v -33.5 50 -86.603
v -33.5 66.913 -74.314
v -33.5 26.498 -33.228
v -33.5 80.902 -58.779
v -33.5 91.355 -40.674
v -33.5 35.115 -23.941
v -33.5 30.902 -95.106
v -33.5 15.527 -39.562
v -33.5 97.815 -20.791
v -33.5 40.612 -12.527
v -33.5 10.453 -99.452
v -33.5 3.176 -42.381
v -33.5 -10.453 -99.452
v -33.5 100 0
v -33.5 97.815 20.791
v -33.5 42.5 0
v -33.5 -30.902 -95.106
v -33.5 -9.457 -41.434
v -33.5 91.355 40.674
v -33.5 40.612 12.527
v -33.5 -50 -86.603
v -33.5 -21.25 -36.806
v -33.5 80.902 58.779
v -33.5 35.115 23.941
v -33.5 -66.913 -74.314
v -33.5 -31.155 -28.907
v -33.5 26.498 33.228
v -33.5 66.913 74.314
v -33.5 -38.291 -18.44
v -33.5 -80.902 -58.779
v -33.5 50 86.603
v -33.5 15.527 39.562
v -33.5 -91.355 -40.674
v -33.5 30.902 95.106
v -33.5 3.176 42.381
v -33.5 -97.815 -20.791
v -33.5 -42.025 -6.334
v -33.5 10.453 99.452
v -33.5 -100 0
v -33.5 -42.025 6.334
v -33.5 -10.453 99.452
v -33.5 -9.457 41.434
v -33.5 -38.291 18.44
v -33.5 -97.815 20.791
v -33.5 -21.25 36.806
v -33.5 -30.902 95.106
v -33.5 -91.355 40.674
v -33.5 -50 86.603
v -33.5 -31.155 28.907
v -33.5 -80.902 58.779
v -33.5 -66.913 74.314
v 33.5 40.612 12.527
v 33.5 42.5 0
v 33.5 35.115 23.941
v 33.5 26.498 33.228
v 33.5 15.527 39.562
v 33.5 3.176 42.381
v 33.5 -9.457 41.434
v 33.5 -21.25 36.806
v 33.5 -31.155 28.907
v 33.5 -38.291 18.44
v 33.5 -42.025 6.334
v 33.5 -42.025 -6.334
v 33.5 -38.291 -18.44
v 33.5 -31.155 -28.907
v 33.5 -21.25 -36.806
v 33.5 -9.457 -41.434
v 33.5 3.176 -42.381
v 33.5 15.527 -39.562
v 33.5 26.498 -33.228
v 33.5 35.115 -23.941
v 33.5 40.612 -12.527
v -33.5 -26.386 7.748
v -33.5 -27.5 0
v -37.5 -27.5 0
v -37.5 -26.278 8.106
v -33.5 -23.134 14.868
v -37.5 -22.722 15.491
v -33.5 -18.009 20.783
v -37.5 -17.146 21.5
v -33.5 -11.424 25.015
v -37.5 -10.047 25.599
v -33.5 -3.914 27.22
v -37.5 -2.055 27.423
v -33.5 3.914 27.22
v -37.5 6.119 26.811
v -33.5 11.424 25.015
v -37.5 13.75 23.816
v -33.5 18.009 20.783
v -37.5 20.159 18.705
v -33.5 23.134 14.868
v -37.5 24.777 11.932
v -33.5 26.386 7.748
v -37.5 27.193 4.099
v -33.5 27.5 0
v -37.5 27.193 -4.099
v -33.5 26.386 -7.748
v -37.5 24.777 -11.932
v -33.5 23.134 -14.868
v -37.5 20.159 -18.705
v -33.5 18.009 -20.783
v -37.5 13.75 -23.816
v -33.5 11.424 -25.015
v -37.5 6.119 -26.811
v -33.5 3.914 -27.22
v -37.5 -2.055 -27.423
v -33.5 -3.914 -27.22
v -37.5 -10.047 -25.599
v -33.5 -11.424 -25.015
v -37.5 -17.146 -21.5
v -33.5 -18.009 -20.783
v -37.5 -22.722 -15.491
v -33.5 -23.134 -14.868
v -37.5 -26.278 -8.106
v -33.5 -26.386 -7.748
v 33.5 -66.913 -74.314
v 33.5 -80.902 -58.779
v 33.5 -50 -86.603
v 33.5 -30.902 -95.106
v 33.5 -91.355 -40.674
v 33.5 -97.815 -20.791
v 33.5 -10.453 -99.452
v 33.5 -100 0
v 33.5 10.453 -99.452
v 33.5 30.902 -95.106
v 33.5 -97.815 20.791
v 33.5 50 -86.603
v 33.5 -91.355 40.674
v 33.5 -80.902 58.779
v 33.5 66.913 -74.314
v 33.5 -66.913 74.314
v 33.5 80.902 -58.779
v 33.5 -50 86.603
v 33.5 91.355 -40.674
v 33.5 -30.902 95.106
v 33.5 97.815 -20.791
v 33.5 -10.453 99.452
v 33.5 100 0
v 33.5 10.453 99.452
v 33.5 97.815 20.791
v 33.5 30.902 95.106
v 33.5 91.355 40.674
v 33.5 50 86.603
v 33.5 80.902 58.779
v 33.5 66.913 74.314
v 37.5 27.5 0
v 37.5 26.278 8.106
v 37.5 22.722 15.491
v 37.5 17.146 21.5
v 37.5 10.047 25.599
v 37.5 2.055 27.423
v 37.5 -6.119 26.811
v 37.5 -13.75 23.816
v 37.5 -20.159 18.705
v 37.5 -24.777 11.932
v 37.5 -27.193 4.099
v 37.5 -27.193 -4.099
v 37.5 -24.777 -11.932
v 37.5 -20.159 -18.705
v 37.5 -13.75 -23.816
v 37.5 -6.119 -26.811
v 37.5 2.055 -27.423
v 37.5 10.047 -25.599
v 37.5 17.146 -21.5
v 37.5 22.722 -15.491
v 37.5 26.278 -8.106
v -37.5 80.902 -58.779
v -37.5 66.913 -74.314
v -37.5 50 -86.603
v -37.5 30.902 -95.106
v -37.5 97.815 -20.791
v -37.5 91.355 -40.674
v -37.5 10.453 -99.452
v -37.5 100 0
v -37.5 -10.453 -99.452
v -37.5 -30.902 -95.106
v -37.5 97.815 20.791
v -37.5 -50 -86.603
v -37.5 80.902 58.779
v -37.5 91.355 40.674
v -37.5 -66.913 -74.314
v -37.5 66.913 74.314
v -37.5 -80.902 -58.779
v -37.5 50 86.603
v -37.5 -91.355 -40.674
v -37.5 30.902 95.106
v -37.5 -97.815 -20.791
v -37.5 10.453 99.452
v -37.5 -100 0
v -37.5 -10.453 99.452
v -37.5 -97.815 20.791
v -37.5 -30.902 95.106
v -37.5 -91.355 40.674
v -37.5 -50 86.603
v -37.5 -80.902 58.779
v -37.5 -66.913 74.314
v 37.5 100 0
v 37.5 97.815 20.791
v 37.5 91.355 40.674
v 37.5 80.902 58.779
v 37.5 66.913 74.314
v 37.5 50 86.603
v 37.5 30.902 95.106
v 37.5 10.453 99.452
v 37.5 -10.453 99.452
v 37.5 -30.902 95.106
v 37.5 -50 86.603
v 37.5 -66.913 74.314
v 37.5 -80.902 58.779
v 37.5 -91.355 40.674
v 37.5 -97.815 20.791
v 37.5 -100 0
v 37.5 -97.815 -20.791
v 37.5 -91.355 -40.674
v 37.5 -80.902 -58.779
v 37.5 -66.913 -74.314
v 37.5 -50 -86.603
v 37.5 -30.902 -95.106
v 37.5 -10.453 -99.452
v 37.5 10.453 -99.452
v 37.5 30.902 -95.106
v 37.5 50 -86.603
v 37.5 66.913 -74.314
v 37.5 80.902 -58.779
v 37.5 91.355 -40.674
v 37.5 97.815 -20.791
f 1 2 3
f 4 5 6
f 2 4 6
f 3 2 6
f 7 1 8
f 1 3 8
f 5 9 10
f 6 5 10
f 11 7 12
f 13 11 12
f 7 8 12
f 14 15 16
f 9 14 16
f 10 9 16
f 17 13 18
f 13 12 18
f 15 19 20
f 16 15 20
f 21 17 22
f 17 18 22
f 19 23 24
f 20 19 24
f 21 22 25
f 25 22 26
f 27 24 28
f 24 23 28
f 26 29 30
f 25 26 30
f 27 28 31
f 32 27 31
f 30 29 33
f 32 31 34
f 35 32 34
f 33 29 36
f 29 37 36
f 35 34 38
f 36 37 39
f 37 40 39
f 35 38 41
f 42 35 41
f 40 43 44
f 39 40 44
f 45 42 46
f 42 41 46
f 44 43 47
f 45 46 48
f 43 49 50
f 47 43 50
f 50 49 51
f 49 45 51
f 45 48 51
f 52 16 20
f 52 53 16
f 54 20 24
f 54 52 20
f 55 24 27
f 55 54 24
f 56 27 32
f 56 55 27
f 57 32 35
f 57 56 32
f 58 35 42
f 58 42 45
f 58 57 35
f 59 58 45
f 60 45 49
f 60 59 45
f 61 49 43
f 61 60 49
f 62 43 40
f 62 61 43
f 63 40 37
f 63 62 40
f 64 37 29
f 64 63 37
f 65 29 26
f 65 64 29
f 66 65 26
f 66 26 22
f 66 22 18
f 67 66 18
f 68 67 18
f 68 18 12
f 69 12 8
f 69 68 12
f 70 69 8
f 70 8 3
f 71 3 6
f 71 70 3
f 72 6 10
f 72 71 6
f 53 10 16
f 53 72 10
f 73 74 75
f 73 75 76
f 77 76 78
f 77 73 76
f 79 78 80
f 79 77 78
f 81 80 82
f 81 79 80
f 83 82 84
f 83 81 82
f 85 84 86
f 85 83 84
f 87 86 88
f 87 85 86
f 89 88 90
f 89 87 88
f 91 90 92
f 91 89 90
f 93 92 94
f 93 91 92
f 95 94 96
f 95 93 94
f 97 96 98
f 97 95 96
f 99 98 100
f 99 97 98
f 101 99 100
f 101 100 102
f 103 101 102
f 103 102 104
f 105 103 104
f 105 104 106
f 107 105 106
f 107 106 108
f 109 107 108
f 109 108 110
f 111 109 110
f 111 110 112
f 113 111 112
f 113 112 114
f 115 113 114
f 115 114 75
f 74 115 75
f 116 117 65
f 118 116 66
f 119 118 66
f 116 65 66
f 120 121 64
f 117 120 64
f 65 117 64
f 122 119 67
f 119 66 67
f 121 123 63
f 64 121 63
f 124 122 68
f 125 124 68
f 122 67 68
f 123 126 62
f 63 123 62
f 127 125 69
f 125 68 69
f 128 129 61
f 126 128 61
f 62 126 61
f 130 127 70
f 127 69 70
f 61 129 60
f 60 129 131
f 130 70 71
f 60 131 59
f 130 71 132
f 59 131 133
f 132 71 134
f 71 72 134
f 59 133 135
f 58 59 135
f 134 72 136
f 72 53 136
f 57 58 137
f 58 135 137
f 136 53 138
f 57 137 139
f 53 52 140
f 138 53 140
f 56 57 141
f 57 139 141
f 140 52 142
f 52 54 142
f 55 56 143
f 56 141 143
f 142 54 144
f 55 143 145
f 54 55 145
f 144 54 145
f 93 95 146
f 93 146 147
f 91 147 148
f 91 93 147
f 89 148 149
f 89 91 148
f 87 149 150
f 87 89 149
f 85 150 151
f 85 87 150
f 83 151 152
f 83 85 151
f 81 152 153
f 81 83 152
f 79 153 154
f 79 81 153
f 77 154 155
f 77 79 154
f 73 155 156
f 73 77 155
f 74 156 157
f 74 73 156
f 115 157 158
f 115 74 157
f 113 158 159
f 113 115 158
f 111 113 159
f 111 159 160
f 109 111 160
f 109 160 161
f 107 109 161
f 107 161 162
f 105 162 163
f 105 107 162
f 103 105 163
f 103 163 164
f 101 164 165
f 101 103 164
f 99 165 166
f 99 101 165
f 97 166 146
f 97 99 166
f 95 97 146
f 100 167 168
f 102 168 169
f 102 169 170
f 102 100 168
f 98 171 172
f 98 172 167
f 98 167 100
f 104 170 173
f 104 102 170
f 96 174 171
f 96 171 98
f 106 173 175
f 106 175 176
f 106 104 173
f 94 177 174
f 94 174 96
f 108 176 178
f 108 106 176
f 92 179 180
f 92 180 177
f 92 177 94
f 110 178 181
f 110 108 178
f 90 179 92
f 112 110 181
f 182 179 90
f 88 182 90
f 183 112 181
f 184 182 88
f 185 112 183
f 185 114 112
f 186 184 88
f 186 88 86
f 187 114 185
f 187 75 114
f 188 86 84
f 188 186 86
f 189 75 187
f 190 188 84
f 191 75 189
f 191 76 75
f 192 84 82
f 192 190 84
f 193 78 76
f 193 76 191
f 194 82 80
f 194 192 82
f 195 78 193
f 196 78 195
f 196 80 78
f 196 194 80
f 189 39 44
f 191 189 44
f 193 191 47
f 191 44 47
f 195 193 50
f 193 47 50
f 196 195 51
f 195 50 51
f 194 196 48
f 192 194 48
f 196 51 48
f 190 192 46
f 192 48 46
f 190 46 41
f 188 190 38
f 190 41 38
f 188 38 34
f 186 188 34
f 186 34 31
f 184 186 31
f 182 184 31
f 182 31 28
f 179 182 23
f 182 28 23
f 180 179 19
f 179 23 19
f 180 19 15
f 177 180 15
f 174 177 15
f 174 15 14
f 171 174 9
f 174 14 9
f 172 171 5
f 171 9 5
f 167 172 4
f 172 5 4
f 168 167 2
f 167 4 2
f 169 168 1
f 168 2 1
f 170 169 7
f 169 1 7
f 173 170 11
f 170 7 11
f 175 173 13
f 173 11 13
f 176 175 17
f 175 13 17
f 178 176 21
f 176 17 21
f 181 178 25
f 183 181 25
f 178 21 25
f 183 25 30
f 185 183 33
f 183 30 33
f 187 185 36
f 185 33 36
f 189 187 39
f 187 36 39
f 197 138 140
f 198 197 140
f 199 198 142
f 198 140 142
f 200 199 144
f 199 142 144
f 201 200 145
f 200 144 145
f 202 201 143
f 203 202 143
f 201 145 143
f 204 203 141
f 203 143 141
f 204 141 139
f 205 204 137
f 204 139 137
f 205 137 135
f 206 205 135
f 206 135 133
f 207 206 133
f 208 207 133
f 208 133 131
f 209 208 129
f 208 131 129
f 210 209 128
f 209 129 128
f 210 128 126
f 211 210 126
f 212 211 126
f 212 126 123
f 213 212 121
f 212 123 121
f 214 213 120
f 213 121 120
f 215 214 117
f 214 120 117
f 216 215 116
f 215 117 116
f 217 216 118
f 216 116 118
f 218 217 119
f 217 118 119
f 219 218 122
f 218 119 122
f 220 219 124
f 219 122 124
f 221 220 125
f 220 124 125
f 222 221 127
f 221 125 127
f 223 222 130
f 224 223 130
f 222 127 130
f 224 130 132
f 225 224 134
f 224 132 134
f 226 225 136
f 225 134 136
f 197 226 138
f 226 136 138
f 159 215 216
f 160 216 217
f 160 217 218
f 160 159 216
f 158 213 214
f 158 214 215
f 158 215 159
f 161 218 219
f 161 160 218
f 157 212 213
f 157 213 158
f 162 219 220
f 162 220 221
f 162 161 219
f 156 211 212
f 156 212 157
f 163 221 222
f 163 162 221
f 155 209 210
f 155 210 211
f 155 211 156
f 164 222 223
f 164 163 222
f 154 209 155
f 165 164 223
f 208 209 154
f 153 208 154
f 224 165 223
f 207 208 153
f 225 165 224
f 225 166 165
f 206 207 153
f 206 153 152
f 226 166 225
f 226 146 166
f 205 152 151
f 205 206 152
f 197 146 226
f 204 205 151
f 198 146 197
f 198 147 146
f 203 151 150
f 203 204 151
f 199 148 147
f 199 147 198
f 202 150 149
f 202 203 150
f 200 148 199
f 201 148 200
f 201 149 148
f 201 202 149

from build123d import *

# Parameters (mm, degrees)
F0_R     = 42.5
F0_R_2   = 27.5
F1_DEPTH = 33.5
F2_R     = 100
F2_R_2   = 42.5
F2_R_3   = 27.5
F3_DEPTH = 4
F4_R     = 100
F4_R_2   = 42.5
F4_R_3   = 27.5
F5_DEPTH = 4


# Not quite as in the source:
# - a feature names something its author has since deleted; it is built from what else it names


with BuildPart() as f1:
    # F0 (on Right) → F1 (new body, symmetric)
    with BuildSketch(Plane.YZ):
        Circle(F0_R)
        Circle(F0_R_2, mode=Mode.SUBTRACT)
    extrude(amount=F1_DEPTH, both=True)

    # F2 (on face) → F3 (join)
    with BuildSketch(Plane.YZ.offset(33.5)):
        Circle(F2_R)
        Circle(F2_R_2, mode=Mode.SUBTRACT)
        Circle(F2_R_2)
        Circle(F2_R_3, mode=Mode.SUBTRACT)
    extrude(amount=F3_DEPTH)

    # F4 (on face) → F5 (join)
    with BuildSketch(Plane(origin=(-33.5, 0, 0), x_dir=(0, -1, 0), z_dir=(-1, 0, 0))):
        Circle(F4_R)
        Circle(F4_R_2, mode=Mode.SUBTRACT)
        Circle(F4_R_2)
        Circle(F4_R_3, mode=Mode.SUBTRACT)
    extrude(amount=F5_DEPTH)


solid = f1.part
